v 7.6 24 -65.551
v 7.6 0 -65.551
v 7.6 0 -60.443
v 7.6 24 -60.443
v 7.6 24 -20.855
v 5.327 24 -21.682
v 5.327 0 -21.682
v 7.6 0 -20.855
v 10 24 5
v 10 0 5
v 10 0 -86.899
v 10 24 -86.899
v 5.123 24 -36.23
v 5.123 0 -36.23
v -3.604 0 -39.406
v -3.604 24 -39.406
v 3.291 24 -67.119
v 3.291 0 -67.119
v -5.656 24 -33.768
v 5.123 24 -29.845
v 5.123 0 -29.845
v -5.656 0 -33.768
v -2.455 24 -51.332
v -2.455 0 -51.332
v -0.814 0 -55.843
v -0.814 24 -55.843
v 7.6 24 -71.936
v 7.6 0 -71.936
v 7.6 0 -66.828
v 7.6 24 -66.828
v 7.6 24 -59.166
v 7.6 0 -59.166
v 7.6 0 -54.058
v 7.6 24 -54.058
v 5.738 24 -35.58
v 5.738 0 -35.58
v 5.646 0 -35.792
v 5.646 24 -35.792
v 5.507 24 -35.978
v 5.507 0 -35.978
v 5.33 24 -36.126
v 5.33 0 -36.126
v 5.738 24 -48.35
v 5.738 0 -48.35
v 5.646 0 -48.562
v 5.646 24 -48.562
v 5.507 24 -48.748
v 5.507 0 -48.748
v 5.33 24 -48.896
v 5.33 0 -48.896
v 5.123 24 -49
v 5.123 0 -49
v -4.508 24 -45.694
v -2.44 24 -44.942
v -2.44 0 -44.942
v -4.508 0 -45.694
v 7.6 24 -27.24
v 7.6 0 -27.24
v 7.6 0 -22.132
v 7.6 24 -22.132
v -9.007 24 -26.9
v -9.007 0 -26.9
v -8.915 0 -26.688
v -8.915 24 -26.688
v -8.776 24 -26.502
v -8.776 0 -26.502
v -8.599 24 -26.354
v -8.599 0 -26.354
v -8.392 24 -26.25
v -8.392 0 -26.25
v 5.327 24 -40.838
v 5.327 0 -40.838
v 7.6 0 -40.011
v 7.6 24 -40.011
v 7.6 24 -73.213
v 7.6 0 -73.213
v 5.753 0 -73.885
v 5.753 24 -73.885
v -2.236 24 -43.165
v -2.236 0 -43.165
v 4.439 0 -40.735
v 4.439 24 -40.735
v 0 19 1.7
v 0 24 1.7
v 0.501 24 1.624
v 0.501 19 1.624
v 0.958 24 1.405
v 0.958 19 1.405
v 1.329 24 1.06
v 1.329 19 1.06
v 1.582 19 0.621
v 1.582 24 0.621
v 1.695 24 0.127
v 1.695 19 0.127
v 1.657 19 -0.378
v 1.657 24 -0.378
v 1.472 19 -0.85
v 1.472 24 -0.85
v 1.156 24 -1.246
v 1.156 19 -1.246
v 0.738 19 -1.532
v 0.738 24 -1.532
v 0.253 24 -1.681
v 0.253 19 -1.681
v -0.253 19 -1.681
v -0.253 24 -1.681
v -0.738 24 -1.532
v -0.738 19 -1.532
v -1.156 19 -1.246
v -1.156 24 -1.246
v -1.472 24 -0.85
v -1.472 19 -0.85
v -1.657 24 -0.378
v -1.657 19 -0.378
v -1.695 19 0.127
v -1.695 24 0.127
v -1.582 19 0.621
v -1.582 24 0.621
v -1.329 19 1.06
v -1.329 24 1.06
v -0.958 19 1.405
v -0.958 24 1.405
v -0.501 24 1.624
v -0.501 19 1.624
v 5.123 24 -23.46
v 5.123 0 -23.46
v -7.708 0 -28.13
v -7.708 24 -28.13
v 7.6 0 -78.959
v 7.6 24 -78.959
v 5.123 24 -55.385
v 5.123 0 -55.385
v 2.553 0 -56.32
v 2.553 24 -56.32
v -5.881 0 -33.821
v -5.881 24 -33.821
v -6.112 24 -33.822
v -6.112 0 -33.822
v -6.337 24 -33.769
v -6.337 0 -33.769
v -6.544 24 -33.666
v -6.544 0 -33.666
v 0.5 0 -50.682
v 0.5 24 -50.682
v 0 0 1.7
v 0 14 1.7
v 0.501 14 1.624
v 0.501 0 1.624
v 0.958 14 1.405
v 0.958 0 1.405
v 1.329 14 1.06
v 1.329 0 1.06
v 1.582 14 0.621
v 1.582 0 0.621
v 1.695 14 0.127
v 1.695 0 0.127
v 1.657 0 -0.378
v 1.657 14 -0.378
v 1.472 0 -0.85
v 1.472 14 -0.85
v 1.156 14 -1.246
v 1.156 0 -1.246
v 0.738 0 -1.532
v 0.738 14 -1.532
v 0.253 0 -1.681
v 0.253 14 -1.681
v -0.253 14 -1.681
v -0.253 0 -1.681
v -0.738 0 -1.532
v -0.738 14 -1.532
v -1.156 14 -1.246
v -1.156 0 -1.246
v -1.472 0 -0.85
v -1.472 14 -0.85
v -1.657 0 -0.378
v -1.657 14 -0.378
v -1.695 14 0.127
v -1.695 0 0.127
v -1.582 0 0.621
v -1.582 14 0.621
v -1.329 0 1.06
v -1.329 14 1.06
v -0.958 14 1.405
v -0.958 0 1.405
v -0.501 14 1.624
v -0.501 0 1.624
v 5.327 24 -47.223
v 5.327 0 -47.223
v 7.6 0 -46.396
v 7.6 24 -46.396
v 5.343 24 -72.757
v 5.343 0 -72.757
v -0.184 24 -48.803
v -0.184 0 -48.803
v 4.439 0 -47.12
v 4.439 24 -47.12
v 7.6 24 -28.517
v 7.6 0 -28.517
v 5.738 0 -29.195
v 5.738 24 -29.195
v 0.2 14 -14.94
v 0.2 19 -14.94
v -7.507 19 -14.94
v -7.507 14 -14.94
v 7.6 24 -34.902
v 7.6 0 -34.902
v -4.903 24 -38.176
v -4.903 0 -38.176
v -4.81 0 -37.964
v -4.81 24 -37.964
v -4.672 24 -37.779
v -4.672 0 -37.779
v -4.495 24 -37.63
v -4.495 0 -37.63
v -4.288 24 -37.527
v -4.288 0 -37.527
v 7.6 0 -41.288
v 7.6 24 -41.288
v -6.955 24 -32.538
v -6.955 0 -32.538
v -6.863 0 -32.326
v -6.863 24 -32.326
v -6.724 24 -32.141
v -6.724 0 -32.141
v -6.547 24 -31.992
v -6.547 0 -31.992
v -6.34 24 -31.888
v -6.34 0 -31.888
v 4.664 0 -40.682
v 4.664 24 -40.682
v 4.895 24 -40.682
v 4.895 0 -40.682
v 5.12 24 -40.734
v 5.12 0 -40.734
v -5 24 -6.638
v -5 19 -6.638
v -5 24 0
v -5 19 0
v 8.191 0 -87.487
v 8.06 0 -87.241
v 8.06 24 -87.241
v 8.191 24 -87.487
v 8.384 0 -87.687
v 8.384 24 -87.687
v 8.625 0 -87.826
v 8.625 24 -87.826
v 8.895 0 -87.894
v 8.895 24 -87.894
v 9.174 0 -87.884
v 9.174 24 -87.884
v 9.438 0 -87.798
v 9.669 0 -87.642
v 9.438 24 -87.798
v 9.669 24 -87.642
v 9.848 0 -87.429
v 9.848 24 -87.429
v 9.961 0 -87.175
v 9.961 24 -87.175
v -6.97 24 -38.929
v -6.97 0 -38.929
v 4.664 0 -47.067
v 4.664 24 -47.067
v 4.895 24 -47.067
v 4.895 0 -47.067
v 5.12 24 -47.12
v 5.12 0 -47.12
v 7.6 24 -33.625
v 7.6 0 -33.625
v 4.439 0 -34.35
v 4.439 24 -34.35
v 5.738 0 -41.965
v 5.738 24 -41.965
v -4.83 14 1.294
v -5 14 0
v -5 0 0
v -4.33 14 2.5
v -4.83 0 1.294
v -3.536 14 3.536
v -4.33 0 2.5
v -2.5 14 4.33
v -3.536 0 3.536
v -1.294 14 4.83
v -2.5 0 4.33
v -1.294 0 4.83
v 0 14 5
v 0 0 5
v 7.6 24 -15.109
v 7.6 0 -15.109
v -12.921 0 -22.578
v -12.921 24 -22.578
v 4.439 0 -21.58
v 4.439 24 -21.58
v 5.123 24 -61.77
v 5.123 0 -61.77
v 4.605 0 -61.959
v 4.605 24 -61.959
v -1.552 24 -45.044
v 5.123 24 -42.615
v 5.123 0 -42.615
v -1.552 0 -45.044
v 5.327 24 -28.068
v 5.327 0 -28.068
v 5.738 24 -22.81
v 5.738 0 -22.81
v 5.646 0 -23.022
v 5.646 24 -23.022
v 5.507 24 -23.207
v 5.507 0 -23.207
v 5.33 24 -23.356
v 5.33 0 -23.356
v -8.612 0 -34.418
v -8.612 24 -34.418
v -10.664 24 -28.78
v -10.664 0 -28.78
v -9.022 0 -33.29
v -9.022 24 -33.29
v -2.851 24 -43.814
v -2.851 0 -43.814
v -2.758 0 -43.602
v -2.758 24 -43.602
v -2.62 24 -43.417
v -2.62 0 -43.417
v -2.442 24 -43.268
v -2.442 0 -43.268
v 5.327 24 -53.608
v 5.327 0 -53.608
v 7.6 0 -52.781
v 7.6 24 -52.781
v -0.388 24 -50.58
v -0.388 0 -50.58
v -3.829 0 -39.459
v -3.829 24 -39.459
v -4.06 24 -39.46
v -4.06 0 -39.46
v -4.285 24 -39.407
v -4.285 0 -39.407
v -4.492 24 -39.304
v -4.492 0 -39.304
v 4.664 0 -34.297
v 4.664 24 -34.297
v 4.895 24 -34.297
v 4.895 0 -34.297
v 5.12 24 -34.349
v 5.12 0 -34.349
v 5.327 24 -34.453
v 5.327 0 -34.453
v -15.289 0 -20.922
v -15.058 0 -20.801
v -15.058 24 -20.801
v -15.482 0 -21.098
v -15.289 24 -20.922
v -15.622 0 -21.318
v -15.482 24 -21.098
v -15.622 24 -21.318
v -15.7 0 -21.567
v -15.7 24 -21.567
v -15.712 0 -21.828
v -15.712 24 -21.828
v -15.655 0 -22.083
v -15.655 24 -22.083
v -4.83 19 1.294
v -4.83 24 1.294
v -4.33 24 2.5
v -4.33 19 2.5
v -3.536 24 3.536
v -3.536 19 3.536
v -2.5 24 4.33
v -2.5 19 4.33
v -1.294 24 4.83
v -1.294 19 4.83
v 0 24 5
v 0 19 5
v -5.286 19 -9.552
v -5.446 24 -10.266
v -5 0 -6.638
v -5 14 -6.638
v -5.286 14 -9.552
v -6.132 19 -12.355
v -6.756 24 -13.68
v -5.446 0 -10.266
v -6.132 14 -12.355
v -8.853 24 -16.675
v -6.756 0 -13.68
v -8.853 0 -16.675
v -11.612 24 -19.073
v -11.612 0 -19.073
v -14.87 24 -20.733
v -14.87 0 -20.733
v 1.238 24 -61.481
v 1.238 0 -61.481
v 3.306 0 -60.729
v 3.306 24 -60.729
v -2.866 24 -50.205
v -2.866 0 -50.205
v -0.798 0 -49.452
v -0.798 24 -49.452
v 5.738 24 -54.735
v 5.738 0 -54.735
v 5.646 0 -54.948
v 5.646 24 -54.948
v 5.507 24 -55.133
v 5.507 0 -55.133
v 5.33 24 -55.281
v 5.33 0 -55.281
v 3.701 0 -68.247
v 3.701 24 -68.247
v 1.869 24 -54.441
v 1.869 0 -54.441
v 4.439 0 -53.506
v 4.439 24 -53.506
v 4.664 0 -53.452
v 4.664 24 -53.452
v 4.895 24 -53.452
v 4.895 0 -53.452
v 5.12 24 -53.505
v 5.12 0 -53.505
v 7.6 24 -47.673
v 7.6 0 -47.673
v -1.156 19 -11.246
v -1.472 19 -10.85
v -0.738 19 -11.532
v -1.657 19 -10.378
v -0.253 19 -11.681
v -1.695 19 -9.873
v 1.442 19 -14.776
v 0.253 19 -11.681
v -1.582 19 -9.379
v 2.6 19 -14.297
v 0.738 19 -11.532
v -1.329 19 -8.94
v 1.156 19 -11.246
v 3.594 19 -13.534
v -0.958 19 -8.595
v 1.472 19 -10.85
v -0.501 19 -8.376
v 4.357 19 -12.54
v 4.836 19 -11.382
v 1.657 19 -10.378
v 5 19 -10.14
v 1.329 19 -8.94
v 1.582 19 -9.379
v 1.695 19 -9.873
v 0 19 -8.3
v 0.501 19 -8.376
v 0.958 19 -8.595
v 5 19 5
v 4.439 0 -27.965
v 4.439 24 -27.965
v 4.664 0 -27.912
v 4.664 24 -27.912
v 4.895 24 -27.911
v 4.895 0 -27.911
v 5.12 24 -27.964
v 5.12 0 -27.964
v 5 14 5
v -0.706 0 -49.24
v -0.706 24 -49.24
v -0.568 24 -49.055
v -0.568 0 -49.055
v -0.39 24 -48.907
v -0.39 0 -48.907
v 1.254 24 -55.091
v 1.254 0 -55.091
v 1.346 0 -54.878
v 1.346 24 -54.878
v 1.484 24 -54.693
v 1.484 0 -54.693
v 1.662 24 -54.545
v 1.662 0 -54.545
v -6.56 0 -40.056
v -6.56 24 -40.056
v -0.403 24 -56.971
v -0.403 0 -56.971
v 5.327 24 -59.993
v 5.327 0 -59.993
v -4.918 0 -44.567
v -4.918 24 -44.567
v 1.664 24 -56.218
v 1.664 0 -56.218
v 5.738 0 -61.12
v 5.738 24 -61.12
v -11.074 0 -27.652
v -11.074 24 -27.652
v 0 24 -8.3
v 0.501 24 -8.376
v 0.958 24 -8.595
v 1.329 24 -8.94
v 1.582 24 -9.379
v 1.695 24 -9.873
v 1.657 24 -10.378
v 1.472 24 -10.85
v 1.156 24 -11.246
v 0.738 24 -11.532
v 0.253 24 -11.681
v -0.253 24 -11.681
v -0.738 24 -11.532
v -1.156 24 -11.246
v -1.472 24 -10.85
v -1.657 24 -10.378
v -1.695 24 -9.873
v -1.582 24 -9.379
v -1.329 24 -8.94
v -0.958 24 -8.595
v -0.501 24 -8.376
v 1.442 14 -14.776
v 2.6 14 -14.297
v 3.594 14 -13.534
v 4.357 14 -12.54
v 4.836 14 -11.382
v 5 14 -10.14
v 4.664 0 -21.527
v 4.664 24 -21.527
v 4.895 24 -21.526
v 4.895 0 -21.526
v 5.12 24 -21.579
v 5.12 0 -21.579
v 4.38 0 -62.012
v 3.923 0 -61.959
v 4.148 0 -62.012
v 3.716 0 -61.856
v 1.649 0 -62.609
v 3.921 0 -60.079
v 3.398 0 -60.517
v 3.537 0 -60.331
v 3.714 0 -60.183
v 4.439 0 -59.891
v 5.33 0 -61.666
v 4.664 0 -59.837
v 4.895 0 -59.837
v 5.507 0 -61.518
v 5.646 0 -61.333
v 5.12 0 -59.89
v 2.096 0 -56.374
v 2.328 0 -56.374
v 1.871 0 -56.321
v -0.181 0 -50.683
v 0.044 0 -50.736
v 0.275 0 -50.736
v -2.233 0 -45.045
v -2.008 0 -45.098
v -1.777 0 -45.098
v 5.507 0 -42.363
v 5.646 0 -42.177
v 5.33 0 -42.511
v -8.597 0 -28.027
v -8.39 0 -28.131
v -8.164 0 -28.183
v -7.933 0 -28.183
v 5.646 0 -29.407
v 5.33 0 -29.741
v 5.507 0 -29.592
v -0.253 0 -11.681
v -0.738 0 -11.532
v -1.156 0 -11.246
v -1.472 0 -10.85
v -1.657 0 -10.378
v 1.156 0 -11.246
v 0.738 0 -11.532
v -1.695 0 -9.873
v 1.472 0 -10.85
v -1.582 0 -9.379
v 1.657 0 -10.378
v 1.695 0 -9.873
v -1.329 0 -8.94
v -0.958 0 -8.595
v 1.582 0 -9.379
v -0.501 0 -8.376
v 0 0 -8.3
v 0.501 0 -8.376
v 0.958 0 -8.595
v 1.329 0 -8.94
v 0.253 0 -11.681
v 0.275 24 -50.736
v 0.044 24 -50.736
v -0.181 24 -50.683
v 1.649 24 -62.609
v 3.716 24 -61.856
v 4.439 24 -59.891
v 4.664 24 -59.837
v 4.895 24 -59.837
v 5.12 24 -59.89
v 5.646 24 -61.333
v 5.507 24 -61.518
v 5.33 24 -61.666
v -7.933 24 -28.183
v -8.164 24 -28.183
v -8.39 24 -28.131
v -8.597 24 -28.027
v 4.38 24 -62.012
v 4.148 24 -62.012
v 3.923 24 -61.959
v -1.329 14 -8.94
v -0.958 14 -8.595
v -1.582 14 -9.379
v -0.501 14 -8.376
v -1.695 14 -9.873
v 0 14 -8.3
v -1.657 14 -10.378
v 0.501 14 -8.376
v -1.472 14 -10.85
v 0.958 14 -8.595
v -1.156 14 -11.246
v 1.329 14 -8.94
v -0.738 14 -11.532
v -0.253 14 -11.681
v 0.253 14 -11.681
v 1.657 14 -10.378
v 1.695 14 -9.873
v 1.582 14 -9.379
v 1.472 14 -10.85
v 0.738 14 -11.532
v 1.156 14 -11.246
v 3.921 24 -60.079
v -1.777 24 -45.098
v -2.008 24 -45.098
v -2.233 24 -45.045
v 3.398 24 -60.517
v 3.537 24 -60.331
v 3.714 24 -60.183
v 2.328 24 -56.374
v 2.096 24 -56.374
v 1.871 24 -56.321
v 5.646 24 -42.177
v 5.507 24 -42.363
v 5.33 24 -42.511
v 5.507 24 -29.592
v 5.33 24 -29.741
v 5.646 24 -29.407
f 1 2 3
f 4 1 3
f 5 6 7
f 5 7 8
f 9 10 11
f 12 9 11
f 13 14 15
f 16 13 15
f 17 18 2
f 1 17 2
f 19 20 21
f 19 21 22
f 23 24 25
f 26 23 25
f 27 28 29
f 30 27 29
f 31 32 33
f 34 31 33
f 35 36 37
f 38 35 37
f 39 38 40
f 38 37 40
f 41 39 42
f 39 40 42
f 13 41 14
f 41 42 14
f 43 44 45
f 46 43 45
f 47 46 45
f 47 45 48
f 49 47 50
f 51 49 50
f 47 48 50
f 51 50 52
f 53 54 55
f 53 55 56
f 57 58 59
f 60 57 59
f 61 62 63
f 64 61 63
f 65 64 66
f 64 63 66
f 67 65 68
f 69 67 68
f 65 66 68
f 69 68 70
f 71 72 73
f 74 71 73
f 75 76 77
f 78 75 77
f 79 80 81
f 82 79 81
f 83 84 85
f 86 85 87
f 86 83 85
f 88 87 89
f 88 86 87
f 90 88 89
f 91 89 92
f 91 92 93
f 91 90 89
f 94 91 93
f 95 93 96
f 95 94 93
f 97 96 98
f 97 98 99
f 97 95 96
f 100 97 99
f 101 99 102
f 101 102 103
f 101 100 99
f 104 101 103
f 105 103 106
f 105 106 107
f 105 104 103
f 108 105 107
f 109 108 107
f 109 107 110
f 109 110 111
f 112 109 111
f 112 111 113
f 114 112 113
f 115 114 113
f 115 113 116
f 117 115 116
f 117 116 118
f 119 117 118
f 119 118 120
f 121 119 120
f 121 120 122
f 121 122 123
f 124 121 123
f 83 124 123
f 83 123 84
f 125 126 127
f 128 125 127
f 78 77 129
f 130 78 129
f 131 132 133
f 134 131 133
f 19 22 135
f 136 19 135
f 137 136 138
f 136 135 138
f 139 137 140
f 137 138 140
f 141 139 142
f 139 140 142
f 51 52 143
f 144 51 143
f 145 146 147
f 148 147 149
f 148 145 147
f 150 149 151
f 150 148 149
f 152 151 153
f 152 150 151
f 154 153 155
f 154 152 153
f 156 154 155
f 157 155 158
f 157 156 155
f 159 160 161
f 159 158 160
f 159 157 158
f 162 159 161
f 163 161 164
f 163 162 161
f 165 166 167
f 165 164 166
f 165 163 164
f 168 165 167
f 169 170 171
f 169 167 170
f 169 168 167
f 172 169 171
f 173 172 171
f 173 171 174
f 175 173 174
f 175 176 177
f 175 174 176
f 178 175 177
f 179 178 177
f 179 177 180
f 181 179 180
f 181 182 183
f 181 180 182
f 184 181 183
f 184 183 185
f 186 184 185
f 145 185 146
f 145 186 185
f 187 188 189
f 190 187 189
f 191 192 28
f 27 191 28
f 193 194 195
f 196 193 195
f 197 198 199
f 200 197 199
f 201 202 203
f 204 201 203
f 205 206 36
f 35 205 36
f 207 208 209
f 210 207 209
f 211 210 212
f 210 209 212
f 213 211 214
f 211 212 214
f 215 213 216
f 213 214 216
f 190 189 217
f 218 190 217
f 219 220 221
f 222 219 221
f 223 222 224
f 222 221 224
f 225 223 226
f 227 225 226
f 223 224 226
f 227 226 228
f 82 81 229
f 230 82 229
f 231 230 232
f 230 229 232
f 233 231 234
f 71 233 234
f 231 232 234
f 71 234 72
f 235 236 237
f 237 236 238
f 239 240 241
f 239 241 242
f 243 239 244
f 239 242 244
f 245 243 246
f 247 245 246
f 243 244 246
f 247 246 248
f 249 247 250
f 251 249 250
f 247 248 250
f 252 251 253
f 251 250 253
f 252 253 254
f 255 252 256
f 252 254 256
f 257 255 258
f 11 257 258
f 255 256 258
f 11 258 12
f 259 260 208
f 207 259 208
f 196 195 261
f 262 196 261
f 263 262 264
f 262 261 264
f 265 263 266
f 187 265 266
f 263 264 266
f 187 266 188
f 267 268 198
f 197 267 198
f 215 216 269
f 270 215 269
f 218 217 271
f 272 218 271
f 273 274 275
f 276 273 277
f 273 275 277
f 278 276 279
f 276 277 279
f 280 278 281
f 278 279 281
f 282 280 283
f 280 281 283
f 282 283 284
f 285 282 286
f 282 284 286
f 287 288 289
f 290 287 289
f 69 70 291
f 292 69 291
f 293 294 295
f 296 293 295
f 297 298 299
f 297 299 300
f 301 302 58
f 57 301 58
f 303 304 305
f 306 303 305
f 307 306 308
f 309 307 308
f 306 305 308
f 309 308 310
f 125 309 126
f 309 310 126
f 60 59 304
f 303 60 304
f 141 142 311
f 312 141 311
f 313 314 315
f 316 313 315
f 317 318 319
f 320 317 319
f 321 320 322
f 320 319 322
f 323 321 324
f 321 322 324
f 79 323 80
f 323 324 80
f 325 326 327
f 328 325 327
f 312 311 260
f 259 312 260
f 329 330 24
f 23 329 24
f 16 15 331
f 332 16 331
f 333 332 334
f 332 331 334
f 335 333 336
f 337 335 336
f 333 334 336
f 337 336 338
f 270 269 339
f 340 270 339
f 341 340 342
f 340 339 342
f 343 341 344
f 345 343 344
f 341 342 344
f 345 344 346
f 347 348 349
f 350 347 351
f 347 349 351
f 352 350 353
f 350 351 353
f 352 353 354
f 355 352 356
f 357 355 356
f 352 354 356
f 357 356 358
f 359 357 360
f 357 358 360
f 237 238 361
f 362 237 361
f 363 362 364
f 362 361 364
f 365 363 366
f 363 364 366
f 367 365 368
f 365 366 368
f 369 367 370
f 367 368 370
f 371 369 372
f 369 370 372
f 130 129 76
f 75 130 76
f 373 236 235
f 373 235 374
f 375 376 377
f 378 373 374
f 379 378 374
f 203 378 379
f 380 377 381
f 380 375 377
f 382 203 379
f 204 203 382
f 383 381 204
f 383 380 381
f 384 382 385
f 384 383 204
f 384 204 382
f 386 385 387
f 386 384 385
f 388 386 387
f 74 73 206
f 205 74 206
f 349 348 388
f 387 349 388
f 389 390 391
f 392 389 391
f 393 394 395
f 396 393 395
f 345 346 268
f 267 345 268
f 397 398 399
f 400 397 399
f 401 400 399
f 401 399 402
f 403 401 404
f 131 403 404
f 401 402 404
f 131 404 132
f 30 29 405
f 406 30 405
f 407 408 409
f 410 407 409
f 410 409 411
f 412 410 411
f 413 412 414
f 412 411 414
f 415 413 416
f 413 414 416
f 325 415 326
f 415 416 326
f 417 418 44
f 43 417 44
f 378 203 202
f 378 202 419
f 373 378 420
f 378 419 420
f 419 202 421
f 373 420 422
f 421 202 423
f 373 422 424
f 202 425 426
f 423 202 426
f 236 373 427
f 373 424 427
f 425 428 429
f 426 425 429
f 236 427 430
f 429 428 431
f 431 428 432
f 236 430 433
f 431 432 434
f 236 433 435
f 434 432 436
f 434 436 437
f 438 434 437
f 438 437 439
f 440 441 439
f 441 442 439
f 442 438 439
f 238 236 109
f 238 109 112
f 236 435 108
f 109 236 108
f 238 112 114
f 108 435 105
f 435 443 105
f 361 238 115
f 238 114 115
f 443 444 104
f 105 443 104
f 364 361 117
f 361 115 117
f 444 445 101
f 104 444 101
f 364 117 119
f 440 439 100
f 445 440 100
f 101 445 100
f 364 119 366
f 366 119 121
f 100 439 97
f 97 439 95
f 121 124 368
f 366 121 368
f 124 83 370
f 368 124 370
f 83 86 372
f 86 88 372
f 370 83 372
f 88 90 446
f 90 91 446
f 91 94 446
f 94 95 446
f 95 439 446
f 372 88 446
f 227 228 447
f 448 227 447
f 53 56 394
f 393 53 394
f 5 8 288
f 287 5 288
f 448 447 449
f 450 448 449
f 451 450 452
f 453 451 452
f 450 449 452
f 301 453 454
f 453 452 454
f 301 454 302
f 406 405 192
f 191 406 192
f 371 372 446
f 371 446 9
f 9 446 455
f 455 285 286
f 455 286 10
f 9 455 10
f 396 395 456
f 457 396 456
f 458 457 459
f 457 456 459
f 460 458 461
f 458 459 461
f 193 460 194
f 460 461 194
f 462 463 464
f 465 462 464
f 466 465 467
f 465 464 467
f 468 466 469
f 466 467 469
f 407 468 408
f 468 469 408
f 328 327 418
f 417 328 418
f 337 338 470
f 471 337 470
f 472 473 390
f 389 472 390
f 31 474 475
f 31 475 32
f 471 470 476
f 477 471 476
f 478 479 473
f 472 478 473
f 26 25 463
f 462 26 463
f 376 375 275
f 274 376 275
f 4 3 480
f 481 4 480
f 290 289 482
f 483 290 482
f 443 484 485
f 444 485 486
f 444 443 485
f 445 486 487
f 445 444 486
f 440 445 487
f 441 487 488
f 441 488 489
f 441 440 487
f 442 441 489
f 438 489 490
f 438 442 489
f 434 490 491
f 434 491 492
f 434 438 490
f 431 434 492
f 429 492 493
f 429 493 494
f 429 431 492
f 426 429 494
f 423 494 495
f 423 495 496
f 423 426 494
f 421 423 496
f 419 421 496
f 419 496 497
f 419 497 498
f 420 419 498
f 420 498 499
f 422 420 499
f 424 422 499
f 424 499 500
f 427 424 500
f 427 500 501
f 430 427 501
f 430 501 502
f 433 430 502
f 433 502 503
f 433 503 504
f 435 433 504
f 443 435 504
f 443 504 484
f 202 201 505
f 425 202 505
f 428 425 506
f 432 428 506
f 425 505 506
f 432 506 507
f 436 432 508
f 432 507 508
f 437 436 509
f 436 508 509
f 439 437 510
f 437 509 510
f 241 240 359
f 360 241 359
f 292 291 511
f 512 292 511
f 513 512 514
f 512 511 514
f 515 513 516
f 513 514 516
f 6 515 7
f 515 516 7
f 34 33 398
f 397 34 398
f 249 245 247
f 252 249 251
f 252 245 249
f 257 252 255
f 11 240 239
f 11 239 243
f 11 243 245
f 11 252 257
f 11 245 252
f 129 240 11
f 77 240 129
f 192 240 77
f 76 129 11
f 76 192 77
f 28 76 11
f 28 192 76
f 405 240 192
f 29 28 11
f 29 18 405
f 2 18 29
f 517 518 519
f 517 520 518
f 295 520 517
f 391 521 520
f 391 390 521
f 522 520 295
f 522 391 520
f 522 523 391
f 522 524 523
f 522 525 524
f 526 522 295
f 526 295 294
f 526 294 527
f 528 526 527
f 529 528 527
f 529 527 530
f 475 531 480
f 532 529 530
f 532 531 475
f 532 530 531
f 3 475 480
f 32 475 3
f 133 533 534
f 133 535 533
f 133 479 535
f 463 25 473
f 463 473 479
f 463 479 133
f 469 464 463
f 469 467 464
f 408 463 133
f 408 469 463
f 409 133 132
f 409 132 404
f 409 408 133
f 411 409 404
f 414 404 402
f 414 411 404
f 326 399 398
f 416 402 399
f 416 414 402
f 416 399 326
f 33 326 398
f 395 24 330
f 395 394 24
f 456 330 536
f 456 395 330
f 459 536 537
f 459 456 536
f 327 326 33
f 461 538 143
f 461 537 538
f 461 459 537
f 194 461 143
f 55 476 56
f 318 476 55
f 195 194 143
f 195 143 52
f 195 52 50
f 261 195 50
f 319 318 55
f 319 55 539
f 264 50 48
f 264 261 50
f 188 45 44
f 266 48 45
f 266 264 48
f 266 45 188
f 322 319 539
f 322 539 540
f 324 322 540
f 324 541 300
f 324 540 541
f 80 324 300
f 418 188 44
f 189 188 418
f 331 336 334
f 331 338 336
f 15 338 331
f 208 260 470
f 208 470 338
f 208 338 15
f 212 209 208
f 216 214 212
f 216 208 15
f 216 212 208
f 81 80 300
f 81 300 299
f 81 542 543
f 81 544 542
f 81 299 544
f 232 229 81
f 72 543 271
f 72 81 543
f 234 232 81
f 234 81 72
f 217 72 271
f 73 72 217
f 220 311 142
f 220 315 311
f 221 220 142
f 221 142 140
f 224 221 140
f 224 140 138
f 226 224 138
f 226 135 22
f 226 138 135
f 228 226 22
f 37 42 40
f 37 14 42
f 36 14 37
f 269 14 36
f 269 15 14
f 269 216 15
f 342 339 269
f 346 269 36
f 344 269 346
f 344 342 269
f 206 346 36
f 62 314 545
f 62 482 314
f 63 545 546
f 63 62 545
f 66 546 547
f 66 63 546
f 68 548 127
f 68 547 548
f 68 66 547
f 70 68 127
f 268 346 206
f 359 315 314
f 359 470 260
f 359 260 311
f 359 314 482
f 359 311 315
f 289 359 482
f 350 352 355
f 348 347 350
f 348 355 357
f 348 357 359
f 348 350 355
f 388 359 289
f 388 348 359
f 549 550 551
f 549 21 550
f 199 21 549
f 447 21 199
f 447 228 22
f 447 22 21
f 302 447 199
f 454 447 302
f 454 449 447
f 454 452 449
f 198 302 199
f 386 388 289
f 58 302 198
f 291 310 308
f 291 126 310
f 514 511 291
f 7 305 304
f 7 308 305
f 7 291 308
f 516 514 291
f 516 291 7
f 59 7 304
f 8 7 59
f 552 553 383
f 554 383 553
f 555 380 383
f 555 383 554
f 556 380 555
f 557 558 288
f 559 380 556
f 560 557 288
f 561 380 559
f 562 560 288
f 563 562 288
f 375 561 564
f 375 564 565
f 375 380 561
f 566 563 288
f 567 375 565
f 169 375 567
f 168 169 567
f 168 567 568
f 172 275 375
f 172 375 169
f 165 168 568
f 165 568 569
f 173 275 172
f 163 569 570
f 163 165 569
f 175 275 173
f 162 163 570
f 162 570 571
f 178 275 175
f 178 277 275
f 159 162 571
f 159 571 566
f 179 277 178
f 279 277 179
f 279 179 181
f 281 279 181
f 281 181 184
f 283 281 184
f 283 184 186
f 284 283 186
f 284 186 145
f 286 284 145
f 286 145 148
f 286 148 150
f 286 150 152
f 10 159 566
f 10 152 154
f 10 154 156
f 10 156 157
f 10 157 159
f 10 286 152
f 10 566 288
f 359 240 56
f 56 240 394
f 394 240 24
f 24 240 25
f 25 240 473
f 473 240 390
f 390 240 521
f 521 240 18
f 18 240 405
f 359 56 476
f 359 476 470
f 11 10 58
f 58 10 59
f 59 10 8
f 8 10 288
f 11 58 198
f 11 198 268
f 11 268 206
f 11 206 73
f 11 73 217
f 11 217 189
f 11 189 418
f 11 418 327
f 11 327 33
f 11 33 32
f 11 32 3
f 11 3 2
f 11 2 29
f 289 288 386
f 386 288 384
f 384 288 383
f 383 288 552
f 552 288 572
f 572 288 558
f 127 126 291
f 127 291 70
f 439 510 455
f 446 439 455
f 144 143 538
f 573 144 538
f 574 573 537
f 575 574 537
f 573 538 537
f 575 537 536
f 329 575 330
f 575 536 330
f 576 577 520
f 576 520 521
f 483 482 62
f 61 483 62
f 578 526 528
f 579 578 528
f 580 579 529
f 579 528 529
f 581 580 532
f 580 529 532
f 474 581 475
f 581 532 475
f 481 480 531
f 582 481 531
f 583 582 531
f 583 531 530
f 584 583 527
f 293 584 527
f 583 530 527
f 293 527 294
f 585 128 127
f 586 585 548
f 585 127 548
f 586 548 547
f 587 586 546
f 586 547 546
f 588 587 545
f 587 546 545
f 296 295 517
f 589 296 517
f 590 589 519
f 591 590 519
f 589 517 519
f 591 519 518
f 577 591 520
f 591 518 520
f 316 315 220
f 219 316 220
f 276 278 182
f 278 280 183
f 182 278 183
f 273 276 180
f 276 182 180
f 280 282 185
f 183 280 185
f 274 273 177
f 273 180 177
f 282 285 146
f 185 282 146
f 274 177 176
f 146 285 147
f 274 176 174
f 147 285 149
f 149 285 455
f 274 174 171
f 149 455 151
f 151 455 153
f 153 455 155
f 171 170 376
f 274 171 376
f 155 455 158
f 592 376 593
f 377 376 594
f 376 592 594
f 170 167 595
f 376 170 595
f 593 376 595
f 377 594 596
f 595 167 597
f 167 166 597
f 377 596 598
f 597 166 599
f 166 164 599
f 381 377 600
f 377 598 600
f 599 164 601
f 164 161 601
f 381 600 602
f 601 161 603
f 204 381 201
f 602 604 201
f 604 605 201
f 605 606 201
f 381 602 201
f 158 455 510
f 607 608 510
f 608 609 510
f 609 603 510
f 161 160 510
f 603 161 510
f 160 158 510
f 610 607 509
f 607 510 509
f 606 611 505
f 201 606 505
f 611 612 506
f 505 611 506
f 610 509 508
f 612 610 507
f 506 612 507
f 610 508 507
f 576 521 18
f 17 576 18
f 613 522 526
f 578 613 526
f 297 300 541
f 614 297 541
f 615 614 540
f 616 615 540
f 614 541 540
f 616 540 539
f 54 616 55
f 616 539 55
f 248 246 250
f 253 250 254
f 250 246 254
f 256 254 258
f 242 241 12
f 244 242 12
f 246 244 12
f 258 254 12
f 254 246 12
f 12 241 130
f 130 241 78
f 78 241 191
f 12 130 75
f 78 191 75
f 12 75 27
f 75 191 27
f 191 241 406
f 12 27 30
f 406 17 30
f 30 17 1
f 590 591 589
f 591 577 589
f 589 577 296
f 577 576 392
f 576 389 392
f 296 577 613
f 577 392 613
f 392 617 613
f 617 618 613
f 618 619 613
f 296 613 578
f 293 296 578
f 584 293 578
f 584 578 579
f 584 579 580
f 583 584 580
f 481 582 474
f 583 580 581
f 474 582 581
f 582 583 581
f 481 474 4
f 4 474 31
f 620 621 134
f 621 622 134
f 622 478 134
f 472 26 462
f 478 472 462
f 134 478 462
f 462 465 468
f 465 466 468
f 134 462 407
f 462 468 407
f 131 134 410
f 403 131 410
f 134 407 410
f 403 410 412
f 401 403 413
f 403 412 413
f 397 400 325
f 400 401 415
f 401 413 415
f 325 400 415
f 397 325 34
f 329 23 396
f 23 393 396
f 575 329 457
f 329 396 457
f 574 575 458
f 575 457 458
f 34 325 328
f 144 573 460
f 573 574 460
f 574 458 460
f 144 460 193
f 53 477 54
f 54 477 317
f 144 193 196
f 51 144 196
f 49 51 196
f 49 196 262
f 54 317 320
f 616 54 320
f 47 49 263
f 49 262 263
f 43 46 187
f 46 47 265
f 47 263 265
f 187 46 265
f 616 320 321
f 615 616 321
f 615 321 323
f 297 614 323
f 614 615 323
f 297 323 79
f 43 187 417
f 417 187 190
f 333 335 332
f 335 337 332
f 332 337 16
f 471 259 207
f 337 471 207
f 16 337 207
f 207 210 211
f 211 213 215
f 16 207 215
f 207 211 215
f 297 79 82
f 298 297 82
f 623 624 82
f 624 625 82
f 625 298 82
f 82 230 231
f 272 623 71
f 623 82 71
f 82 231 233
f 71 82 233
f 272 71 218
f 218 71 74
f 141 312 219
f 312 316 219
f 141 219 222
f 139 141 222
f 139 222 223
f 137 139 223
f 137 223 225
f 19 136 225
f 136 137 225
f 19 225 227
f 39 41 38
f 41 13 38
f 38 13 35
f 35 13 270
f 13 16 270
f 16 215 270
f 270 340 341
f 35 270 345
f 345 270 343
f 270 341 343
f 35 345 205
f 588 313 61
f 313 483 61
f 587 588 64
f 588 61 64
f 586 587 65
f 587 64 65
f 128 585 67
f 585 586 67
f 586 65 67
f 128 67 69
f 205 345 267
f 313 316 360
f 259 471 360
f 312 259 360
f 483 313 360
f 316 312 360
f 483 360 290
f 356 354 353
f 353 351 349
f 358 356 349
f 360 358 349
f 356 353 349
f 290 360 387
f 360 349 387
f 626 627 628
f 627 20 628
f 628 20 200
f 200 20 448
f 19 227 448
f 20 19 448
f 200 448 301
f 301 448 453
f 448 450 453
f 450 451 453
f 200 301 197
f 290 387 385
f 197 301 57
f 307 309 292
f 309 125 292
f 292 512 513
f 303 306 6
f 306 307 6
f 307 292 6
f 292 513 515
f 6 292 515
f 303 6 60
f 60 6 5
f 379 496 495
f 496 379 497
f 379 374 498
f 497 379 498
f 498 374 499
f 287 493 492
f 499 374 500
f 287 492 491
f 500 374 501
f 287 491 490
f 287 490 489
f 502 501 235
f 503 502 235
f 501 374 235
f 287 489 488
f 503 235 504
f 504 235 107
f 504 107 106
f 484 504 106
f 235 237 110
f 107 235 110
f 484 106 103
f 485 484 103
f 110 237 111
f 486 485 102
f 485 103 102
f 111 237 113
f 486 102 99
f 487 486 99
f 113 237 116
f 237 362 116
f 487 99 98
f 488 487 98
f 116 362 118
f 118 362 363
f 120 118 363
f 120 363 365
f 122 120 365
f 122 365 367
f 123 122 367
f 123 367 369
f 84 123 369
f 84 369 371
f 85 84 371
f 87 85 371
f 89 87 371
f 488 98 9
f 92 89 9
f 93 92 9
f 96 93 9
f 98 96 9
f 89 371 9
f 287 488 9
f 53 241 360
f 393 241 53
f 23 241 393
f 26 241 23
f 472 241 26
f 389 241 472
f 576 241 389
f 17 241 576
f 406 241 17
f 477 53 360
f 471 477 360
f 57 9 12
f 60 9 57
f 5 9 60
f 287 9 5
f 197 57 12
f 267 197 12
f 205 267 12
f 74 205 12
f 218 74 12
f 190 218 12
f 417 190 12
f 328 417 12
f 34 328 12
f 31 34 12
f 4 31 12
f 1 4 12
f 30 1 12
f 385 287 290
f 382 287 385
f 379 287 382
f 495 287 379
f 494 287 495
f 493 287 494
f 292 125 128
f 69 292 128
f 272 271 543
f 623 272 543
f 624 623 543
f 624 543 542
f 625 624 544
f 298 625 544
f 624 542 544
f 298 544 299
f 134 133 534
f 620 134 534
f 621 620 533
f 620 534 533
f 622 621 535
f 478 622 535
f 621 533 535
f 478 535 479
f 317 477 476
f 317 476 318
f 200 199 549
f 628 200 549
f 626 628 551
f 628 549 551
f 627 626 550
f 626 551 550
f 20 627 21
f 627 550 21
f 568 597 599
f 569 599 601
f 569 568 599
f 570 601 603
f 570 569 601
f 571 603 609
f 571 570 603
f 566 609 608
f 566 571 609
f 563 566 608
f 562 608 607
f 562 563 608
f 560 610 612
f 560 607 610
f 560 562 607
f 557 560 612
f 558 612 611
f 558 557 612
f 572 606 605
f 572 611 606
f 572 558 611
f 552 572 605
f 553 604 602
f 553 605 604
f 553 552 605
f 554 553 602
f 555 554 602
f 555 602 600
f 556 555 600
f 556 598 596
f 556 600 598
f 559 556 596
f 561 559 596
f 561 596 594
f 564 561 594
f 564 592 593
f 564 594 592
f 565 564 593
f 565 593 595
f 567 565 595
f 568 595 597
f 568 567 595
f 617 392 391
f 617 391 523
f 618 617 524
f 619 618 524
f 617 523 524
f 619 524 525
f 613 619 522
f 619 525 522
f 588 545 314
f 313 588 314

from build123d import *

# Parameters (mm, degrees)
SKETCH_1_R          = 1.7
EXTRUDE_1_DEPTH     = 24
CUT_EXTRUDE_START   = -14
SKETCH_2_R          = 1.7
CUT_EXTRUDE_1_DEPTH = 5
FILLET_1_R          = 1
FILLET_2_R          = 15


with BuildPart() as part:
    # 草图1 → 凸台-拉伸1 (new body)
    with BuildSketch(Plane(origin=(0, 0, 0), x_dir=(1, 0, 0), z_dir=(0, 1, 0))):
        with BuildLine():
            Line((-5, 17.140740034), (-5, 0))
            ThreePointArc((-5, 0), (-3.535533906, -3.535533906), (0, -5))
            Line((0, -5), (10, -5))
            Line((10, -5), (10, 92.570484452))
            Line((10, 92.570484452), (-15.997319233, 21.143436891))
            Line((-15.997319233, 21.143436891), (-5, 17.140740034))
        make_face()
        with Locations(Location((0, 0, 0), (0, 0, 270))):
            Circle(SKETCH_1_R, mode=Mode.SUBTRACT)
        with Locations(Location((0, 10, 0), (0, 0, 270))):
            Circle(SKETCH_1_R, mode=Mode.SUBTRACT)
        with BuildLine():
            Line((7.6, 15.108741736), (-12.9212086, 22.577850837))
            Line((-12.9212086, 22.577850837), (-11.074299826, 27.65219099))
            Line((-11.074299826, 27.65219099), (-9.00697606, 26.899746674))
            ThreePointArc((-9.00697606, 26.899746674), (-8.776165309, 26.502415559), (-8.392030021, 26.250253511))
            Line((-8.392030021, 26.250253511), (4.438901994, 21.58017618))
            ThreePointArc((4.438901994, 21.58017618), (4.895253337, 21.526426111), (5.327464148, 21.682437114))
            Line((5.327464148, 21.682437114), (7.6, 20.855301707))
            Line((7.6, 20.855301707), (7.6, 15.108741736))
        make_face(mode=Mode.SUBTRACT)
        with BuildLine():
            ThreePointArc((5.73788832, 22.810068259), (5.507077569, 23.207399374), (5.122942281, 23.459561422))
            Line((5.122942281, 23.459561422), (-7.707989734, 28.129638753))
            ThreePointArc((-7.707989734, 28.129638753), (-8.164341077, 28.183388821), (-8.596551888, 28.027377819))
            Line((-8.596551888, 28.027377819), (-10.663875654, 28.779822134))
            Line((-10.663875654, 28.779822134), (-9.022178966, 33.290346714))
            Line((-9.022178966, 33.290346714), (-6.9548552, 32.537902399))
            ThreePointArc((-6.9548552, 32.537902399), (-6.724044449, 32.140571284), (-6.339909161, 31.888409236))
            Line((-6.339909161, 31.888409236), (4.438901994, 27.965242815))
            ThreePointArc((4.438901994, 27.965242815), (4.895253337, 27.911492746), (5.327464148, 28.067503748))
            Line((5.327464148, 28.067503748), (7.6, 27.240368342))
            Line((7.6, 27.240368342), (7.6, 22.132315034))
            Line((7.6, 22.132315034), (5.73788832, 22.810068259))
        make_face(mode=Mode.SUBTRACT)
        with BuildLine():
            ThreePointArc((5.73788832, 29.195134893), (5.507077569, 29.592466009), (5.122942281, 29.844628056))
            Line((5.122942281, 29.844628056), (-5.655868874, 33.767794478))
            ThreePointArc((-5.655868874, 33.767794478), (-6.112220217, 33.821544546), (-6.544431028, 33.665533544))
            Line((-6.544431028, 33.665533544), (-8.611754794, 34.417977859))
            Line((-8.611754794, 34.417977859), (-6.970058106, 38.928502439))
            Line((-6.970058106, 38.928502439), (-4.90273434, 38.176058124))
            ThreePointArc((-4.90273434, 38.176058124), (-4.671923589, 37.778727008), (-4.287788301, 37.526564961))
            Line((-4.287788301, 37.526564961), (4.438901994, 34.35030945))
            ThreePointArc((4.438901994, 34.35030945), (4.895253337, 34.296559381), (5.327464148, 34.452570383))
            Line((5.327464148, 34.452570383), (7.6, 33.625434977))
            Line((7.6, 33.625434977), (7.6, 28.517381669))
            Line((7.6, 28.517381669), (5.73788832, 29.195134893))
        make_face(mode=Mode.SUBTRACT)
        with BuildLine():
            ThreePointArc((5.73788832, 35.580201528), (5.507077569, 35.977532644), (5.122942281, 36.229694691))
            Line((5.122942281, 36.229694691), (-3.603748014, 39.405950202))
            ThreePointArc((-3.603748014, 39.405950202), (-4.060099357, 39.459700271), (-4.492310168, 39.303689269))
            Line((-4.492310168, 39.303689269), (-6.559633934, 40.056133584))
            Line((-6.559633934, 40.056133584), (-4.917937246, 44.566658164))
            Line((-4.917937246, 44.566658164), (-2.85061348, 43.814213848))
            ThreePointArc((-2.85061348, 43.814213848), (-2.619802729, 43.416882733), (-2.235667441, 43.164720685))
            Line((-2.235667441, 43.164720685), (4.438901994, 40.735376085))
            ThreePointArc((4.438901994, 40.735376085), (4.895253337, 40.681626016), (5.327464148, 40.837637018))
            Line((5.327464148, 40.837637018), (7.6, 40.010501612))
            Line((7.6, 40.010501612), (7.6, 34.902448304))
            Line((7.6, 34.902448304), (5.73788832, 35.580201528))
        make_face(mode=Mode.SUBTRACT)
        with BuildLine():
            ThreePointArc((5.73788832, 41.965268163), (5.507077569, 42.362599278), (5.122942281, 42.614761326))
            Line((5.122942281, 42.614761326), (-1.551627154, 45.044105927))
            ThreePointArc((-1.551627154, 45.044105927), (-2.007978497, 45.097855995), (-2.440189308, 44.941844993))
            Line((-2.440189308, 44.941844993), (-4.507513074, 45.694289309))
            Line((-4.507513074, 45.694289309), (-2.865816386, 50.204813888))
            Line((-2.865816386, 50.204813888), (-0.79849262, 49.452369573))
            ThreePointArc((-0.79849262, 49.452369573), (-0.567681869, 49.055038458), (-0.183546581, 48.80287641))
            Line((-0.183546581, 48.80287641), (4.438901994, 47.120442719))
            ThreePointArc((4.438901994, 47.120442719), (4.895253337, 47.066692651), (5.327464148, 47.222703653))
            Line((5.327464148, 47.222703653), (7.6, 46.395568247))
            Line((7.6, 46.395568247), (7.6, 41.287514939))
            Line((7.6, 41.287514939), (5.73788832, 41.965268163))
        make_face(mode=Mode.SUBTRACT)
        with BuildLine():
            ThreePointArc((5.73788832, 48.350334798), (5.507077569, 48.747665913), (5.122942281, 48.999827961))
            Line((5.122942281, 48.999827961), (0.500493706, 50.682261652))
            ThreePointArc((0.500493706, 50.682261652), (0.044142363, 50.73601172), (-0.388068448, 50.580000718))
            Line((-0.388068448, 50.580000718), (-2.455392214, 51.332445033))
            Line((-2.455392214, 51.332445033), (-0.813695526, 55.842969613))
            Line((-0.813695526, 55.842969613), (1.25362824, 55.090525298))
            ThreePointArc((1.25362824, 55.090525298), (1.484438991, 54.693194182), (1.868574279, 54.441032135))
            Line((1.868574279, 54.441032135), (4.438901994, 53.505509354))
            ThreePointArc((4.438901994, 53.505509354), (4.895253337, 53.451759286), (5.327464148, 53.607770288))
            Line((5.327464148, 53.607770288), (7.6, 52.780634882))
            Line((7.6, 52.780634882), (7.6, 47.672581574))
            Line((7.6, 47.672581574), (5.73788832, 48.350334798))
        make_face(mode=Mode.SUBTRACT)
        with BuildLine():
            ThreePointArc((5.73788832, 54.735401433), (5.507077569, 55.132732548), (5.122942281, 55.384894596))
            Line((5.122942281, 55.384894596), (2.552614566, 56.320417376))
            ThreePointArc((2.552614566, 56.320417376), (2.096263223, 56.374167445), (1.664052412, 56.218156443))
            Line((1.664052412, 56.218156443), (-0.403271354, 56.970600758))
            Line((-0.403271354, 56.970600758), (1.238425334, 61.481125338))
            Line((1.238425334, 61.481125338), (3.3057491, 60.728681023))
            ThreePointArc((3.3057491, 60.728681023), (3.536559851, 60.331349907), (3.920695139, 60.07918786))
            Line((3.920695139, 60.07918786), (4.438901994, 59.890575989))
            ThreePointArc((4.438901994, 59.890575989), (4.895253337, 59.836825921), (5.327464148, 59.992836923))
            Line((5.327464148, 59.992836923), (7.6, 59.165701516))
            Line((7.6, 59.165701516), (7.6, 54.057648209))
            Line((7.6, 54.057648209), (5.73788832, 54.735401433))
        make_face(mode=Mode.SUBTRACT)
        with BuildLine():
            ThreePointArc((5.73788832, 61.120468068), (5.507077569, 61.517799183), (5.122942281, 61.769961231))
            Line((5.122942281, 61.769961231), (4.604735426, 61.958573101))
            ThreePointArc((4.604735426, 61.958573101), (4.148384083, 62.01232317), (3.716173272, 61.856312167))
            Line((3.716173272, 61.856312167), (1.648849506, 62.608756483))
            Line((1.648849506, 62.608756483), (3.290546194, 67.119281063))
            Line((3.290546194, 67.119281063), (7.6, 65.550768151))
            Line((7.6, 65.550768151), (7.6, 60.442714843))
            Line((7.6, 60.442714843), (5.73788832, 61.120468068))
        make_face(mode=Mode.SUBTRACT)
        Polygon((3.700970366, 68.246912207), (5.342667054, 72.757436787), (7.6, 71.935834786), (7.6, 66.827781478), align=None, mode=Mode.SUBTRACT)
        Polygon((5.753091226, 73.885067932), (7.6, 78.959408084), (7.6, 73.212848113), align=None, mode=Mode.SUBTRACT)
    extrude(amount=EXTRUDE_1_DEPTH)

    # 草图2 → 切除-拉伸1 (cut)
    with BuildSketch(Plane.XZ.offset(CUT_EXTRUDE_START)):
        with BuildLine():
            Line((-5, 5), (-5, -14.940041508))
            Line((-5, -14.940041508), (0.2, -14.940041508))
            ThreePointArc((0.2, -14.940041508), (3.59411255, -13.534154057), (5, -10.140041508))
            Line((5, -10.140041508), (5, 5))
            Line((5, 5), (-5, 5))
        make_face()
        with Locations(Location((0, -10, 0), (0, 0, 270))):
            Circle(SKETCH_2_R, mode=Mode.SUBTRACT)
        with Locations(Location((0, 0, 0), (0, 0, 270))):
            Circle(SKETCH_2_R, mode=Mode.SUBTRACT)
    extrude(amount=-CUT_EXTRUDE_1_DEPTH, mode=Mode.SUBTRACT)

    # 圆角1
    fillet_1_edges = [part.edges().sort_by_distance(p)[0] for p in [
        (-15.997319233, 12, -21.143436891),
        (10, 12, -92.570484452),
    ]]
    fillet(fillet_1_edges, radius=FILLET_1_R)

    # 圆角2
    # the kernel refuses this fillet: 15 mm, written as the material it adds along each edge
    with BuildSketch(Plane(origin=(-5, 0, -17.140740034), x_dir=(-0.9396926207859096, 0, -0.34202014332566527), z_dir=(0, 1, 0))) as fillet_2_piece_1_section:
        with BuildLine():
            CenterArc((FILLET_2_R * 0.70020753821, FILLET_2_R), FILLET_2_R, 200, 70)
            Line((-FILLET_2_R * 0.239485082576, FILLET_2_R * 0.657979856674), (0, 0))
            Line((0, 0), (FILLET_2_R * 0.70020753821, 0))
        make_face()
    fillet_2_piece_1 = extrude(amount=24, mode=Mode.PRIVATE)
    fillet_2_piece_1 = split(fillet_2_piece_1, bisect_by=Plane(origin=(-8.048588234, 14, -17.376417802), z_dir=(0, -1, 0)), keep=Keep.TOP, mode=Mode.PRIVATE)
    fillet_2_piece_1 = split(fillet_2_piece_1, bisect_by=Plane(origin=(-8.048588234, 7, -14.940041508), z_dir=(0, 0, -1)), keep=Keep.TOP, mode=Mode.PRIVATE)
    add(fillet_2_piece_1)
    with BuildSketch(Plane(origin=(-5, 0, -17.140740034), x_dir=(-0.9396926207859096, 0, -0.34202014332566527), z_dir=(0, 1, 0))) as fillet_2_piece_2_section:
        with BuildLine():
            CenterArc((FILLET_2_R * 0.70020753821, FILLET_2_R), FILLET_2_R, 200, 70)
            Line((-FILLET_2_R * 0.239485082576, FILLET_2_R * 0.657979856674), (0, 0))
            Line((0, 0), (FILLET_2_R * 0.70020753821, 0))
        make_face()
    fillet_2_piece_2 = extrude(amount=24, mode=Mode.PRIVATE)
    fillet_2_piece_2 = split(fillet_2_piece_2, bisect_by=Plane(origin=(-5.498513848, 14, -12.327693201), z_dir=(0, -1, 0)), keep=Keep.TOP, mode=Mode.PRIVATE)
    fillet_2_piece_2 = split(fillet_2_piece_2, bisect_by=Plane(origin=(-5.498513848, 7, -14.940041508), z_dir=(0, 0, 1)), keep=Keep.TOP, mode=Mode.PRIVATE)
    add(fillet_2_piece_2)
    with BuildSketch(Plane(origin=(-5, 0, -17.140740034), x_dir=(-0.9396926207859096, 0, -0.34202014332566527), z_dir=(0, 1, 0))) as fillet_2_piece_3_section:
        with BuildLine():
            CenterArc((FILLET_2_R * 0.70020753821, FILLET_2_R), FILLET_2_R, 200, 70)
            Line((-FILLET_2_R * 0.239485082576, FILLET_2_R * 0.657979856674), (0, 0))
            Line((0, 0), (FILLET_2_R * 0.70020753821, 0))
        make_face()
    fillet_2_piece_3 = extrude(amount=24, mode=Mode.PRIVATE)
    fillet_2_piece_3 = split(fillet_2_piece_3, bisect_by=Plane(origin=(-8.048588234, 14, -17.376417802), z_dir=(0, 1, 0)), keep=Keep.TOP, mode=Mode.PRIVATE)
    fillet_2_piece_3 = split(fillet_2_piece_3, bisect_by=Plane(origin=(-8.048588234, 16.5, -14.940041508), z_dir=(0, 0, -1)), keep=Keep.TOP, mode=Mode.PRIVATE)
    fillet_2_piece_3 = split(fillet_2_piece_3, bisect_by=Plane(origin=(-8.048588234, 19, -17.376417802), z_dir=(0, -1, 0)), keep=Keep.TOP, mode=Mode.PRIVATE)
    add(fillet_2_piece_3)
    with BuildSketch(Plane(origin=(-5, 0, -17.140740034), x_dir=(-0.9396926207859096, 0, -0.34202014332566527), z_dir=(0, 1, 0))) as fillet_2_piece_4_section:
        with BuildLine():
            CenterArc((FILLET_2_R * 0.70020753821, FILLET_2_R), FILLET_2_R, 200, 70)
            Line((-FILLET_2_R * 0.239485082576, FILLET_2_R * 0.657979856674), (0, 0))
            Line((0, 0), (FILLET_2_R * 0.70020753821, 0))
        make_face()
    fillet_2_piece_4 = extrude(amount=24, mode=Mode.PRIVATE)
    fillet_2_piece_4 = split(fillet_2_piece_4, bisect_by=Plane(origin=(-8.048588234, 21.5, -14.940041508), z_dir=(0, 0, -1)), keep=Keep.TOP, mode=Mode.PRIVATE)
    fillet_2_piece_4 = split(fillet_2_piece_4, bisect_by=Plane(origin=(-8.048588234, 19, -17.376417802), z_dir=(0, 1, 0)), keep=Keep.TOP, mode=Mode.PRIVATE)
    add(fillet_2_piece_4)
    with BuildSketch(Plane(origin=(-5, 0, -17.140740034), x_dir=(-0.9396926207859096, 0, -0.34202014332566527), z_dir=(0, 1, 0))) as fillet_2_piece_5_section:
        with BuildLine():
            CenterArc((FILLET_2_R * 0.70020753821, FILLET_2_R), FILLET_2_R, 200, 70)
            Line((-FILLET_2_R * 0.239485082576, FILLET_2_R * 0.657979856674), (0, 0))
            Line((0, 0), (FILLET_2_R * 0.70020753821, 0))
        make_face()
    fillet_2_piece_5 = extrude(amount=24, mode=Mode.PRIVATE)
    fillet_2_piece_5 = split(fillet_2_piece_5, bisect_by=Plane(origin=(-5.498513848, 21.5, -14.940041508), z_dir=(0, 0, 1)), keep=Keep.TOP, mode=Mode.PRIVATE)
    fillet_2_piece_5 = split(fillet_2_piece_5, bisect_by=Plane(origin=(-5.498513848, 19, -12.327693201), z_dir=(0, 1, 0)), keep=Keep.TOP, mode=Mode.PRIVATE)
    add(fillet_2_piece_5)


solid = part.part
